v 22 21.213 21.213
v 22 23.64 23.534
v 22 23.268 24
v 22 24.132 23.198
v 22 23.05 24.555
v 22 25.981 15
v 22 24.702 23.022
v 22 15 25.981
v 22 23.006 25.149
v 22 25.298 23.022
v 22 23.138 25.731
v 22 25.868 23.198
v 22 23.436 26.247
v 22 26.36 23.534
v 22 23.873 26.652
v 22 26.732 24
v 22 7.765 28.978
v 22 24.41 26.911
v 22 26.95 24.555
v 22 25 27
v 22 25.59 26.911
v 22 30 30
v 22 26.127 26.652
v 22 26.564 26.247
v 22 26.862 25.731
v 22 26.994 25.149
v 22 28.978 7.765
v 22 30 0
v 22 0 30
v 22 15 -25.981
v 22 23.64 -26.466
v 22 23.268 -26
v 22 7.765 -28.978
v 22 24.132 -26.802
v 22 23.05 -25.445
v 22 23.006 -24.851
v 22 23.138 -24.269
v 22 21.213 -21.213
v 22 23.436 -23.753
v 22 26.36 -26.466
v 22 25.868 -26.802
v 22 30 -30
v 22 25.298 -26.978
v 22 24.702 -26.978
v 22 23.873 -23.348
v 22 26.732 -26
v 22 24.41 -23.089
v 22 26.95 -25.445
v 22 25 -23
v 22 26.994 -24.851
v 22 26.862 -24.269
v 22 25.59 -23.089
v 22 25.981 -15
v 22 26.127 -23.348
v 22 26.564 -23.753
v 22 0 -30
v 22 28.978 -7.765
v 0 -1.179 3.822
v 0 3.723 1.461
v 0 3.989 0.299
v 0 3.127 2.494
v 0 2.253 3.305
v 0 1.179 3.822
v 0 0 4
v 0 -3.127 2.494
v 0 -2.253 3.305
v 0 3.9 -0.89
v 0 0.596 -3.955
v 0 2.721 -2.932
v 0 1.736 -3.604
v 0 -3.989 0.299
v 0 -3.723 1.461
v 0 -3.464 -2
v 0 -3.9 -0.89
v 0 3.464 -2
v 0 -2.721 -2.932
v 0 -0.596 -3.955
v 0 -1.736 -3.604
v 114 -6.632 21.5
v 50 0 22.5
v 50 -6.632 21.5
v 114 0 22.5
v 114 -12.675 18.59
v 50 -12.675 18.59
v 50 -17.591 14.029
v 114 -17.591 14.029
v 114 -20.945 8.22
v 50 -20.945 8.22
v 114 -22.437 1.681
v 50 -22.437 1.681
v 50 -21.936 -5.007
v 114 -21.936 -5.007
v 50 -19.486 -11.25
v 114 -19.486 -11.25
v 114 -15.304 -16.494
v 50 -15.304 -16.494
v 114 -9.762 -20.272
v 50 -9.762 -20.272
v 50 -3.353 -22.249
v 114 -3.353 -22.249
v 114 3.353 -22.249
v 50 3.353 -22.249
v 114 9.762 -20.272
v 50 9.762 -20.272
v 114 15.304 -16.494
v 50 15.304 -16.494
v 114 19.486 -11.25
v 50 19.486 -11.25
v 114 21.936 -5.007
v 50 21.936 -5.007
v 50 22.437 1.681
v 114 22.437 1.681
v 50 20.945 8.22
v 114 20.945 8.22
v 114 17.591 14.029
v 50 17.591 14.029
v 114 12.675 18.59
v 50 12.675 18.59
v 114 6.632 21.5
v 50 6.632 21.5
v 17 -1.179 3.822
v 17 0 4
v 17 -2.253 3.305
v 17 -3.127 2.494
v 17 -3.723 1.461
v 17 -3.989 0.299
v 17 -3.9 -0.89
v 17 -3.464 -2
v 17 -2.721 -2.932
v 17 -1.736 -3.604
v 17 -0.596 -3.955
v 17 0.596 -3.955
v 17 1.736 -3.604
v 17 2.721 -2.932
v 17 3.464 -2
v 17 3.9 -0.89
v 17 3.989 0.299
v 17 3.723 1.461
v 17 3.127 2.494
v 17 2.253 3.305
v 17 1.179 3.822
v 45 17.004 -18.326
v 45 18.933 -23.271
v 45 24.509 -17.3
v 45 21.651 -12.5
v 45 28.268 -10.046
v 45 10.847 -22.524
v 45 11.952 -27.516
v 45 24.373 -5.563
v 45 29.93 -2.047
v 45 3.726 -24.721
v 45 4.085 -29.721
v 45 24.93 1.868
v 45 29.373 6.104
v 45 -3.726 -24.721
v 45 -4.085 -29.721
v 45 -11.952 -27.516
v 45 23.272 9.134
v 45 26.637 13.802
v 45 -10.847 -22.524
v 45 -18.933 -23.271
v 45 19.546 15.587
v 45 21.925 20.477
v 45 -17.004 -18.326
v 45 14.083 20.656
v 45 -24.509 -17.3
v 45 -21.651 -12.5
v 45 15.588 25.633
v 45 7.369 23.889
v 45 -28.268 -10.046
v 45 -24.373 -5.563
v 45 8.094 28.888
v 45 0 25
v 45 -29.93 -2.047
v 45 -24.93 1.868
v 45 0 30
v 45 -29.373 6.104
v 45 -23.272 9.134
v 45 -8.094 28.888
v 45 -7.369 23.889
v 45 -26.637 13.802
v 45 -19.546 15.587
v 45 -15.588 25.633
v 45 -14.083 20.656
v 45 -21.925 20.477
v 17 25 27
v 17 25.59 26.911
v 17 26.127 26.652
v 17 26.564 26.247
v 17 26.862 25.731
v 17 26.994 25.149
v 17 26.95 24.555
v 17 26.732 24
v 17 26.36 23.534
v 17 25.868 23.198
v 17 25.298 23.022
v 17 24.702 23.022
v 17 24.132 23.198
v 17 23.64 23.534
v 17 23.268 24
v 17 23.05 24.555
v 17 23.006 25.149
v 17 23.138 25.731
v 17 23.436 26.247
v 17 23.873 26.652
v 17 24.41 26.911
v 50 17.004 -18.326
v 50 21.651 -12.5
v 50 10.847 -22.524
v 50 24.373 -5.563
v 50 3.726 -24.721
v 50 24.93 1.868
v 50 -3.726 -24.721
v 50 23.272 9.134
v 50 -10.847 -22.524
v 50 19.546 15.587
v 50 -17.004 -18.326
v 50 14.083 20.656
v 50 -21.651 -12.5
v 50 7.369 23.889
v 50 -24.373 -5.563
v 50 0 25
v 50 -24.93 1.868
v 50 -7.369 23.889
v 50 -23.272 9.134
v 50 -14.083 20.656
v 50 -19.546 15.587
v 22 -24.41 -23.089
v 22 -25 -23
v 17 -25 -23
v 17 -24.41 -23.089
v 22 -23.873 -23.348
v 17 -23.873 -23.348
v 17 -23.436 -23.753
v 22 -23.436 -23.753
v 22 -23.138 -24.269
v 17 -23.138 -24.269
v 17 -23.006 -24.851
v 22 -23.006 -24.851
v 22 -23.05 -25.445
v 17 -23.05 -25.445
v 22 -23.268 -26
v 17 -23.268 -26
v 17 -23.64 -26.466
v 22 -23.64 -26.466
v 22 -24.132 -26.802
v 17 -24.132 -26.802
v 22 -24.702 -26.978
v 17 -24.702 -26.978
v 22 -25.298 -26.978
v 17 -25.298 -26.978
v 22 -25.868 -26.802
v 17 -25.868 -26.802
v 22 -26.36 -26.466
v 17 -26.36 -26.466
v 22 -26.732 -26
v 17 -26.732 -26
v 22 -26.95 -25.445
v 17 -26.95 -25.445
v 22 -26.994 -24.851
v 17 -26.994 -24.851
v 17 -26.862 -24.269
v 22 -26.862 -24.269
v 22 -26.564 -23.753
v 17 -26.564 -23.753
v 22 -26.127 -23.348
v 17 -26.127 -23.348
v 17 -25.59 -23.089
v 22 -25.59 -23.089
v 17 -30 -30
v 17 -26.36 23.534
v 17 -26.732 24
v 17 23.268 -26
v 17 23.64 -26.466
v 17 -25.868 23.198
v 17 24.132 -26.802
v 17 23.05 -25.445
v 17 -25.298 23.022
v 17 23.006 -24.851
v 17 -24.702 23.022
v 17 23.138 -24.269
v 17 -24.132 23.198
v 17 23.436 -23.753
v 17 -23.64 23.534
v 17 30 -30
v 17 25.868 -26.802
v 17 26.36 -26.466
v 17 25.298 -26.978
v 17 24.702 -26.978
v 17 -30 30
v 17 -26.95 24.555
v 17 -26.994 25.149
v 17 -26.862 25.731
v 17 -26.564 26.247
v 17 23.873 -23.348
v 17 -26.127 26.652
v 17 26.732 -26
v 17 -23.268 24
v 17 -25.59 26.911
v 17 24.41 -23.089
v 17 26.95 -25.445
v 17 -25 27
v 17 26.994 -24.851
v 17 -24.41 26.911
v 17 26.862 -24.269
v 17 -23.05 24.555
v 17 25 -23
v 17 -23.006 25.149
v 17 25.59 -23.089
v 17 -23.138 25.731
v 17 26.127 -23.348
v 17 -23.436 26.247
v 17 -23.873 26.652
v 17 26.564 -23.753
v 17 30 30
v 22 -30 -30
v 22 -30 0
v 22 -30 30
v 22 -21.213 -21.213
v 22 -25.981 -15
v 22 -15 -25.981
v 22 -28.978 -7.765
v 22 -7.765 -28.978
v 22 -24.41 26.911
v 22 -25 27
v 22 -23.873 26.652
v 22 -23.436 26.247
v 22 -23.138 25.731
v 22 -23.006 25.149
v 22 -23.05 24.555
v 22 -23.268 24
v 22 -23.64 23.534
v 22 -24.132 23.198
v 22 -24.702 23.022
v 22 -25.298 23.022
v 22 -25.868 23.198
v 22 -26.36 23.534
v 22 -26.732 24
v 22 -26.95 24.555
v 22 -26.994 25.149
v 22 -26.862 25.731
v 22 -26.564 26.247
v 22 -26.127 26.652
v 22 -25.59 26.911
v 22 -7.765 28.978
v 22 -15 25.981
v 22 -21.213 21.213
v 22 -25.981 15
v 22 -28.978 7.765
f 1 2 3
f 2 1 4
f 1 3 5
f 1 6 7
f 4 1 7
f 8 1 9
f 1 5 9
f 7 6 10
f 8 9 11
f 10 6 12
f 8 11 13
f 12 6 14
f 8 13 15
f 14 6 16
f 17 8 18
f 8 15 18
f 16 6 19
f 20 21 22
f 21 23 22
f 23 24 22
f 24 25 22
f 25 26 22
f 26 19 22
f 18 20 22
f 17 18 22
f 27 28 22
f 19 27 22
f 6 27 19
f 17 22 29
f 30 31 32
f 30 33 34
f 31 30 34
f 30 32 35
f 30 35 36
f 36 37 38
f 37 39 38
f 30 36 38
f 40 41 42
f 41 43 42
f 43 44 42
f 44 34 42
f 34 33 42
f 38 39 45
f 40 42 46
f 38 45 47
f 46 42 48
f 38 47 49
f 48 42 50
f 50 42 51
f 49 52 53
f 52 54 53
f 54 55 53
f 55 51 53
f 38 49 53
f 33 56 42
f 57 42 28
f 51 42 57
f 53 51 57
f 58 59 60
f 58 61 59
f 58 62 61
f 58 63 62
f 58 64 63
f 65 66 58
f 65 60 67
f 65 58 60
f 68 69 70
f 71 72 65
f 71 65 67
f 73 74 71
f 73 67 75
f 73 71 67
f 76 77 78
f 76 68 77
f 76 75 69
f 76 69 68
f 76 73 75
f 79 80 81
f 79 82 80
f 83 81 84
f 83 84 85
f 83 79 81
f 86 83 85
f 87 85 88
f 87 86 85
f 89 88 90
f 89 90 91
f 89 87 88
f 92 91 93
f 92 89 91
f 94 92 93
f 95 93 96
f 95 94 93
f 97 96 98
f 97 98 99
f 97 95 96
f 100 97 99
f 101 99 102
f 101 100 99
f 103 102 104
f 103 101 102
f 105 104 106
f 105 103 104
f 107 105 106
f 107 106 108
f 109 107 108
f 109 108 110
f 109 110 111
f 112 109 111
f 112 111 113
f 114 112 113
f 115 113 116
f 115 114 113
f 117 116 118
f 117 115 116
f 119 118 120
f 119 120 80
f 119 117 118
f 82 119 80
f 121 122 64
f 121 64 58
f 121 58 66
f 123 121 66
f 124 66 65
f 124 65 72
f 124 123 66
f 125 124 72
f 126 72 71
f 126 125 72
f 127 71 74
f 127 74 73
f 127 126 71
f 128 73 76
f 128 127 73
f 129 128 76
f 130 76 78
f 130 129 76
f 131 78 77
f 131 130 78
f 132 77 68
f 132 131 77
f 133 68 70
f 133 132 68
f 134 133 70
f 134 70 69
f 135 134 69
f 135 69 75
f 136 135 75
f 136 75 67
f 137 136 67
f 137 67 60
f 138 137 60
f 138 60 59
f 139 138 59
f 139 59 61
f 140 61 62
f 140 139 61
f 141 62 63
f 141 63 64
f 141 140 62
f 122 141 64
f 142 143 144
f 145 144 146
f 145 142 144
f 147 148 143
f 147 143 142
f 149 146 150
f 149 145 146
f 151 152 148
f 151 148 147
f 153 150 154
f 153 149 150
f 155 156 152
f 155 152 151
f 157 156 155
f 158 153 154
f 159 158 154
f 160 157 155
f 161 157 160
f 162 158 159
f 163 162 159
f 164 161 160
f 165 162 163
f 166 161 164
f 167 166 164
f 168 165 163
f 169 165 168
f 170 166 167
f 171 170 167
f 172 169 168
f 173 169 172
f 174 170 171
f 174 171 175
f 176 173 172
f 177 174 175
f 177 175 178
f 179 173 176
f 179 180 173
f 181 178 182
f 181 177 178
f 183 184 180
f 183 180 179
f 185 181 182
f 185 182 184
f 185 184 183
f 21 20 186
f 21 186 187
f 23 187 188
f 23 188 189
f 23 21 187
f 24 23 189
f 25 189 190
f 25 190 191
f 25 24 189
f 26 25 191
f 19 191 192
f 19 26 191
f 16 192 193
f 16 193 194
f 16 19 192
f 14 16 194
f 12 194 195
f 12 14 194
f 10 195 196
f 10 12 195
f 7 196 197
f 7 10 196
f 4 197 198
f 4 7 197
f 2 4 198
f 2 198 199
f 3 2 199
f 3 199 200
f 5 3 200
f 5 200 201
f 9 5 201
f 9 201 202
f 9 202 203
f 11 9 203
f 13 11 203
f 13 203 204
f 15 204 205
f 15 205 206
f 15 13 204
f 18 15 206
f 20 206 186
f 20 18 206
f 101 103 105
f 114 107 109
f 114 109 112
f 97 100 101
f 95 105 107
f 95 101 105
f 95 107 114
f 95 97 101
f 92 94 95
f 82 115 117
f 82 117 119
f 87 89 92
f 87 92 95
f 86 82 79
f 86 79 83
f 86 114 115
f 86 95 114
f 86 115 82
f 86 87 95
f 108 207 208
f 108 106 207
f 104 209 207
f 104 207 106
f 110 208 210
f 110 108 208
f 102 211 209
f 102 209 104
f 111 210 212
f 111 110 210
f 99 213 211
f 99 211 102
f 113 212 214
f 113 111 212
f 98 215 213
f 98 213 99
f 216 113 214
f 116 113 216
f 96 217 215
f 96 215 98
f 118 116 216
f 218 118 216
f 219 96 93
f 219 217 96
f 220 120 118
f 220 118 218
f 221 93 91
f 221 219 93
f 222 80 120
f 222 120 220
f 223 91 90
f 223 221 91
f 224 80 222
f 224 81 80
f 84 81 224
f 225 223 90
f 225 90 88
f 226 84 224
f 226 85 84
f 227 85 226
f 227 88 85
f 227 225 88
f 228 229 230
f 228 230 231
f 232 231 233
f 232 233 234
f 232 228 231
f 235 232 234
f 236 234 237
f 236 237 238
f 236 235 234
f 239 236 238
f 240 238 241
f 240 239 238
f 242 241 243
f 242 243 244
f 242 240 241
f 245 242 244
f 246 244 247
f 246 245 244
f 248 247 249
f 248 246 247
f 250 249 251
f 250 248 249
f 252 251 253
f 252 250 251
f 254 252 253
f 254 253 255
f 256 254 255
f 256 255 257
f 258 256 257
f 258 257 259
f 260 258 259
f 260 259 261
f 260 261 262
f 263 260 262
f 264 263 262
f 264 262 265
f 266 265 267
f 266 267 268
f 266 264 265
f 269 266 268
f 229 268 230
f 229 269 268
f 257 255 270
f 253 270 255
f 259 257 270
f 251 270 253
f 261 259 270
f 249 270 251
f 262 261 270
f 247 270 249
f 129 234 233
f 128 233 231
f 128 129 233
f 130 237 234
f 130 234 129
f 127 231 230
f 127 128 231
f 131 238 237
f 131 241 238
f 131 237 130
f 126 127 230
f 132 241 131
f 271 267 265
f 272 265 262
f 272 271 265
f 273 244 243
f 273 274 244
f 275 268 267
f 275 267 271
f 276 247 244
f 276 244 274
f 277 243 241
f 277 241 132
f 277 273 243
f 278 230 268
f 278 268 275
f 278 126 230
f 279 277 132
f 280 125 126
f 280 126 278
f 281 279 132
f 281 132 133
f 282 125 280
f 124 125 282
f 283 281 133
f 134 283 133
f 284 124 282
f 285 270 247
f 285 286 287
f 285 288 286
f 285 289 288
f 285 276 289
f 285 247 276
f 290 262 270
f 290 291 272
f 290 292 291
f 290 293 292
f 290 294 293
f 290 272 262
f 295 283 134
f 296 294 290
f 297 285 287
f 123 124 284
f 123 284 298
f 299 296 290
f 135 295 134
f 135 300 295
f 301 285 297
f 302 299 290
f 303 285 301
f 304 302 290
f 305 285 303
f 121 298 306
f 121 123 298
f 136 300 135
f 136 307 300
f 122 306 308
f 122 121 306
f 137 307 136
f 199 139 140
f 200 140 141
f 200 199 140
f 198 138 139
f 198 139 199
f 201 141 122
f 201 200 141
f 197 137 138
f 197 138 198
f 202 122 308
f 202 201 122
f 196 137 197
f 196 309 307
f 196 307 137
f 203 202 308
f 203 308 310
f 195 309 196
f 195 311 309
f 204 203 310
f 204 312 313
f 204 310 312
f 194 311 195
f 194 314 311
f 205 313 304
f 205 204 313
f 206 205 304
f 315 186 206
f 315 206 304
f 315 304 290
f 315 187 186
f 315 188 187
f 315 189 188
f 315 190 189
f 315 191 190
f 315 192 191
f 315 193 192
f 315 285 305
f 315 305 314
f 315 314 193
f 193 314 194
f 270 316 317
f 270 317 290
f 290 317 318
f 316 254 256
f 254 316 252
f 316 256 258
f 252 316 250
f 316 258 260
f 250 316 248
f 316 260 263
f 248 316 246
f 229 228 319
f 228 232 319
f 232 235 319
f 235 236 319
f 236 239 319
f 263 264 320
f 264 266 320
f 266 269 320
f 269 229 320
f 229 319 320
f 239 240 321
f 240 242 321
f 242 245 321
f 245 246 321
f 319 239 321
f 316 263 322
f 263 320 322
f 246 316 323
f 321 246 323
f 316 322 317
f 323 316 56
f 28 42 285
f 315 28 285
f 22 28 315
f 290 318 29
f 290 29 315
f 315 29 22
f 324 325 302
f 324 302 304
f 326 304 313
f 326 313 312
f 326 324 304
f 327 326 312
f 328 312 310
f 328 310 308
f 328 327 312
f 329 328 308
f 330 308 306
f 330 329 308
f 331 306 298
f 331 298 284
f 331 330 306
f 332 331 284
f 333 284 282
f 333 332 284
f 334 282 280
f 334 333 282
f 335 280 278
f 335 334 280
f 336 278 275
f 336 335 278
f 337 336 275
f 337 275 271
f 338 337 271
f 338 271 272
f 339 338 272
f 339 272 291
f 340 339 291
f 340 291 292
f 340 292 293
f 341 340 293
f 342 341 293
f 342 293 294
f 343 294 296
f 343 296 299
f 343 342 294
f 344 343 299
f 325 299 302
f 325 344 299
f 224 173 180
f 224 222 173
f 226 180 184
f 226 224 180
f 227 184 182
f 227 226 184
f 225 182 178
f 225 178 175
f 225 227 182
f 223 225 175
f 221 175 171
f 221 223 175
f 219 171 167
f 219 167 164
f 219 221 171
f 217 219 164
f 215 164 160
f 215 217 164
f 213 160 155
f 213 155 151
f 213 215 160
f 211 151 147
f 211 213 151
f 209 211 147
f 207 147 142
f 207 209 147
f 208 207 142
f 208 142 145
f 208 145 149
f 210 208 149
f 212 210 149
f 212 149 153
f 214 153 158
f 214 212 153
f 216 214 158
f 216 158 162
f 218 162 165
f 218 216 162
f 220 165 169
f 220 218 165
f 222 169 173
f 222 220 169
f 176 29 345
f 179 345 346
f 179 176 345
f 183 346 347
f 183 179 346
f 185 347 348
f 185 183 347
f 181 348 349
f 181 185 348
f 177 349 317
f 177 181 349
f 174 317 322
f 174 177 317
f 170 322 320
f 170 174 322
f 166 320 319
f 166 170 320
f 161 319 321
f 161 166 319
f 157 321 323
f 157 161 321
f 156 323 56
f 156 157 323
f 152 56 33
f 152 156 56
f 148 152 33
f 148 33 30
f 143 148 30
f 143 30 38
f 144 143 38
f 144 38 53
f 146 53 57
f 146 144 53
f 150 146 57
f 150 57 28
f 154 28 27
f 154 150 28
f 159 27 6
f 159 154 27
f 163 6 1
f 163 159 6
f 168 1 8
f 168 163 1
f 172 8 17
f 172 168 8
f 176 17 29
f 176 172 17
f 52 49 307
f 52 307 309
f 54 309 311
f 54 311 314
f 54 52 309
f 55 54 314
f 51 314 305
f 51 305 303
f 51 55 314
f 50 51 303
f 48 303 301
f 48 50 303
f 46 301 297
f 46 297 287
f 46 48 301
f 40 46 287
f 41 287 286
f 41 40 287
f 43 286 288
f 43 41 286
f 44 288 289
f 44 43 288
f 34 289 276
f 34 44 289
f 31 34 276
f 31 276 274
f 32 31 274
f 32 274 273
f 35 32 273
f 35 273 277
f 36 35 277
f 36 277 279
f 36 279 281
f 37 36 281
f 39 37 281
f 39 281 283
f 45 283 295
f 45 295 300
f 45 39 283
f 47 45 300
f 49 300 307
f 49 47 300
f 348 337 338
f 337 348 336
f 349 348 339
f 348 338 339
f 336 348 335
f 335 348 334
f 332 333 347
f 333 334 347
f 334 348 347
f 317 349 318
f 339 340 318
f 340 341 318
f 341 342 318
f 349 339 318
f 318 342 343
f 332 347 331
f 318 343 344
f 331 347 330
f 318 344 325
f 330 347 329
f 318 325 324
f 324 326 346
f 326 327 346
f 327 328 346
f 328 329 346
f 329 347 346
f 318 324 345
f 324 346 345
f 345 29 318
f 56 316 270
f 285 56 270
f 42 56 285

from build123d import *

# Parameters (mm, degrees)
SKETCH2_W           = 60
SKETCH2_H           = 60
SKETCH2_R           = 2
BOSS_EXTRUDE1_DEPTH = 5


with BuildPart() as part:
    # Sketch1 → Revolve1 (revolve)
    with BuildSketch(Plane(origin=(0, 0, 0), x_dir=(1, 0, 0), z_dir=(0, 1, 0)), mode=Mode.PRIVATE) as revolve1_sk:
        Polygon((0, 0), (0, 4), (19, 4), (19, 12), (22, 12), (22, 30), (45, 30), (45, 25), (50, 25), (50, 22.5), (114, 22.5), (114, 0), align=None)
    revolve(revolve1_sk.sketch.rotate(Axis((0, 0, 0), (1, 0, 0)), 180), axis=Axis((0, 0, 0), (1, 0, 0)))

    # Sketch2 → Boss-Extrude1 (add)
    with BuildSketch(Plane.ZY.offset(-22)):
        Rectangle(SKETCH2_W, SKETCH2_H)
        with Locations((-25, 25)):
            Circle(SKETCH2_R, mode=Mode.SUBTRACT)
        with Locations((25, 25)):
            Circle(SKETCH2_R, mode=Mode.SUBTRACT)
        with Locations((25, -25)):
            Circle(SKETCH2_R, mode=Mode.SUBTRACT)
        with Locations((-25, -25)):
            Circle(SKETCH2_R, mode=Mode.SUBTRACT)
    extrude(amount=BOSS_EXTRUDE1_DEPTH)


solid = part.part
